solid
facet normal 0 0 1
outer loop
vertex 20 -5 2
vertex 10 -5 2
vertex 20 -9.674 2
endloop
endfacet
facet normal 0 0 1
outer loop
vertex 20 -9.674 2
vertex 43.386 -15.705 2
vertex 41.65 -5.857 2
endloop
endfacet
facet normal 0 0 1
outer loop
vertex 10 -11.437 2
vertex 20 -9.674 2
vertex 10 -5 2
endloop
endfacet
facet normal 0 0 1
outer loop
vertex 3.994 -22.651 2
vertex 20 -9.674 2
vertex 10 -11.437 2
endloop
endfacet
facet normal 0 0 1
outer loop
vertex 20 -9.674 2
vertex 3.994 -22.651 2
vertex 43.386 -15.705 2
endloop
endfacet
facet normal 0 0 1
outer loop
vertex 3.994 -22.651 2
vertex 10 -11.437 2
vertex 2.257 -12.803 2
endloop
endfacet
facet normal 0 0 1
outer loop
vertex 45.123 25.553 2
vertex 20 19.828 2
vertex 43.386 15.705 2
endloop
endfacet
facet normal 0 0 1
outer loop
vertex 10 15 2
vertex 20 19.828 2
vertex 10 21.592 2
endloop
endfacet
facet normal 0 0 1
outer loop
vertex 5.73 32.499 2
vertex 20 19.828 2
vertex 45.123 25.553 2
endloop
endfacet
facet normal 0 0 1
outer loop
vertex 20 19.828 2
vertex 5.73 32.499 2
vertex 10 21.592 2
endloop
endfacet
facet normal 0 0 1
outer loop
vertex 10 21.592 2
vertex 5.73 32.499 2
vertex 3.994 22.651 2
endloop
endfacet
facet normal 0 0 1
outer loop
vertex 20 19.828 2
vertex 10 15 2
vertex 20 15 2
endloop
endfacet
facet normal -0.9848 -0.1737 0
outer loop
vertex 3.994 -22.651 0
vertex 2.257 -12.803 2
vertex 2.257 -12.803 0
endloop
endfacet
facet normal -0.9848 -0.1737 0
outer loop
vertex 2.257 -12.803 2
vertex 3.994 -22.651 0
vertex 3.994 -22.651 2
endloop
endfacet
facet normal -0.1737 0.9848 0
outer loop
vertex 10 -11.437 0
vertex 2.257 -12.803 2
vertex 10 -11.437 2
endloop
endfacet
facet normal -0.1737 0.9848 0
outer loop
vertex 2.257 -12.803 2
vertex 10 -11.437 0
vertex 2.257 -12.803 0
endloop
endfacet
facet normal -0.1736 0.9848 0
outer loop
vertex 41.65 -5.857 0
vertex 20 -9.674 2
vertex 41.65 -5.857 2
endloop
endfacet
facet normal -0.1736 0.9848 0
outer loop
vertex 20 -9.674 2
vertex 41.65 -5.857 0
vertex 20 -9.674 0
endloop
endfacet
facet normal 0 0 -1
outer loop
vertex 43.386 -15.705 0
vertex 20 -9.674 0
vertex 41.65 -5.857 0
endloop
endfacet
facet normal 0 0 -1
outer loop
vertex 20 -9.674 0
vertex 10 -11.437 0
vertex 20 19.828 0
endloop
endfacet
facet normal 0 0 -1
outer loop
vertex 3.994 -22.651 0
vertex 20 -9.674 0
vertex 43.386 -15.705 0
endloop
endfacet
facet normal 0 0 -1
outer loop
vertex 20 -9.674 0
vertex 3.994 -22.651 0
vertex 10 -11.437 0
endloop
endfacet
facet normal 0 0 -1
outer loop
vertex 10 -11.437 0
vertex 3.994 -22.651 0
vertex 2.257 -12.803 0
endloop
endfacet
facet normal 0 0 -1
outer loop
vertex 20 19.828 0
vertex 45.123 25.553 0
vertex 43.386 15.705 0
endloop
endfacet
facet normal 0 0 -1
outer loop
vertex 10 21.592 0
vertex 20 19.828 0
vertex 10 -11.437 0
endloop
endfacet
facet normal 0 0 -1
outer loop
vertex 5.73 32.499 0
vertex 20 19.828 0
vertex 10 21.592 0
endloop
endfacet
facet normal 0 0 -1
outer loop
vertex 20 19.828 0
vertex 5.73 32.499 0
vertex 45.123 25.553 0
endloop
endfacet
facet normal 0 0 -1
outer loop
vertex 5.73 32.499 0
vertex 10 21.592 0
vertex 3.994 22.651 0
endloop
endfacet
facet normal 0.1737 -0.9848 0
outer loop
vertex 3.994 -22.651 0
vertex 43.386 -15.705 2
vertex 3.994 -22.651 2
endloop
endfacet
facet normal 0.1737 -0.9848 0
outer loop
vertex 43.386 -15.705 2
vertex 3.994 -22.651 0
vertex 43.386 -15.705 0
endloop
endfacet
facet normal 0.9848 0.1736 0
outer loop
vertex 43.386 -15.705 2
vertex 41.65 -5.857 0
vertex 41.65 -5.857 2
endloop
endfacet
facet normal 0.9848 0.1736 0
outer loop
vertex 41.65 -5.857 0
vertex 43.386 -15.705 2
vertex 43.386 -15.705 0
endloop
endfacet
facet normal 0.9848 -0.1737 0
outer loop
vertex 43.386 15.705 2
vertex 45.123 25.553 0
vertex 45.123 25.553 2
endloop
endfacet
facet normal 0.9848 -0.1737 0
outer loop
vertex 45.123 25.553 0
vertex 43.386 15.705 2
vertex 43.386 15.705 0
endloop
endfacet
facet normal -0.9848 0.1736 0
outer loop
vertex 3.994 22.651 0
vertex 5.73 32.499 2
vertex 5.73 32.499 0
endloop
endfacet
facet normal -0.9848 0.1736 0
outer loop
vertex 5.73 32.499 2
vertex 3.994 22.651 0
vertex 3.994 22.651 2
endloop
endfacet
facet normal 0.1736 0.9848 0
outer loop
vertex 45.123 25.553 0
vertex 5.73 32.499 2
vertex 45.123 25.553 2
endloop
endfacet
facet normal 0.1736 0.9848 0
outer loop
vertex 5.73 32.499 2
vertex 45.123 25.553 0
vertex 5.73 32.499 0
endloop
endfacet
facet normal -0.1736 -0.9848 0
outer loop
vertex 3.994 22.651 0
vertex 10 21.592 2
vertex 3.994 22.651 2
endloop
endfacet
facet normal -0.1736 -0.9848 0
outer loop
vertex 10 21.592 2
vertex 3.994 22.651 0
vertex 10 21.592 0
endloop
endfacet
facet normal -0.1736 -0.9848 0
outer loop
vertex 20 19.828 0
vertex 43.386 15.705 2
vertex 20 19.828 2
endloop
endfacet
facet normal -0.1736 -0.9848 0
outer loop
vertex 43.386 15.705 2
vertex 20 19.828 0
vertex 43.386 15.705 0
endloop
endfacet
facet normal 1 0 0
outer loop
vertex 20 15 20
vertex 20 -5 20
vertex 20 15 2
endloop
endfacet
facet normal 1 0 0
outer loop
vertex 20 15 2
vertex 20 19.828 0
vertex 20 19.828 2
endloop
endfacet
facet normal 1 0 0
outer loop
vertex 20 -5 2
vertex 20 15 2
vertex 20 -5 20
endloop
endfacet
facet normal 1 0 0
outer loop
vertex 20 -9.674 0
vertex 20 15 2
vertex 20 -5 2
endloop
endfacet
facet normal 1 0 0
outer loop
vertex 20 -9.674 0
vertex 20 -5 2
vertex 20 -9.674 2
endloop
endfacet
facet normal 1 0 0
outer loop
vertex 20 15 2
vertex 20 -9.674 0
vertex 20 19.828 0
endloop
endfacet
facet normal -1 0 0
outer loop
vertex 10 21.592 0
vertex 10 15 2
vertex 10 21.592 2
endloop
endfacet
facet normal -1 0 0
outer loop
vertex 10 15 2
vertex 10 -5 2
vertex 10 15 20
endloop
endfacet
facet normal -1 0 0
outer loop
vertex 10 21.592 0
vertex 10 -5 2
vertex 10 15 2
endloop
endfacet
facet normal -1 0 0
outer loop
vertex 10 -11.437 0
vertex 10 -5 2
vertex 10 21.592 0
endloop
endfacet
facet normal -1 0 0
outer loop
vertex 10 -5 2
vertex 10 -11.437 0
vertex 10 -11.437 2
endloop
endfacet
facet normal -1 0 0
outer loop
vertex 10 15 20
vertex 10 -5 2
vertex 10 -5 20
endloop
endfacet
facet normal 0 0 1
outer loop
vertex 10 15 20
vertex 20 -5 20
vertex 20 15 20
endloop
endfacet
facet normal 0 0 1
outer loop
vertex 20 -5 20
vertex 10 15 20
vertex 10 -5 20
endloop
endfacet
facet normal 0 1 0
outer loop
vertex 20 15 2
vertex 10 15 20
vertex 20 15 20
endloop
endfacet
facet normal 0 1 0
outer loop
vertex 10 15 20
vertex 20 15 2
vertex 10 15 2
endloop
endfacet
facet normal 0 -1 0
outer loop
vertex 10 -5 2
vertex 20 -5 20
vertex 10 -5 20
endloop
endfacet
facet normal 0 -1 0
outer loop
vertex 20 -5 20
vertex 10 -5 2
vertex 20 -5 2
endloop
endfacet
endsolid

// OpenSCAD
module leg1() {
    rotate(10) {
        translate([0, -23, 0])
            cube([40, 10, 2], false);
    }
}

module leg2() {
    rotate(-10) {
        translate([0, 23, 0])
            cube([40, 10, 2], false);
    }
}

module leg_strut() {
    translate([10, -5, 0])
        cube([10, 20, 20], false);
}

module base() {
    translate([10, -17, 0])
        cube([10, 40, 2], false);
}

module combine() {
    leg1();
    leg2();
    base();
    leg_strut();
}

combine();
